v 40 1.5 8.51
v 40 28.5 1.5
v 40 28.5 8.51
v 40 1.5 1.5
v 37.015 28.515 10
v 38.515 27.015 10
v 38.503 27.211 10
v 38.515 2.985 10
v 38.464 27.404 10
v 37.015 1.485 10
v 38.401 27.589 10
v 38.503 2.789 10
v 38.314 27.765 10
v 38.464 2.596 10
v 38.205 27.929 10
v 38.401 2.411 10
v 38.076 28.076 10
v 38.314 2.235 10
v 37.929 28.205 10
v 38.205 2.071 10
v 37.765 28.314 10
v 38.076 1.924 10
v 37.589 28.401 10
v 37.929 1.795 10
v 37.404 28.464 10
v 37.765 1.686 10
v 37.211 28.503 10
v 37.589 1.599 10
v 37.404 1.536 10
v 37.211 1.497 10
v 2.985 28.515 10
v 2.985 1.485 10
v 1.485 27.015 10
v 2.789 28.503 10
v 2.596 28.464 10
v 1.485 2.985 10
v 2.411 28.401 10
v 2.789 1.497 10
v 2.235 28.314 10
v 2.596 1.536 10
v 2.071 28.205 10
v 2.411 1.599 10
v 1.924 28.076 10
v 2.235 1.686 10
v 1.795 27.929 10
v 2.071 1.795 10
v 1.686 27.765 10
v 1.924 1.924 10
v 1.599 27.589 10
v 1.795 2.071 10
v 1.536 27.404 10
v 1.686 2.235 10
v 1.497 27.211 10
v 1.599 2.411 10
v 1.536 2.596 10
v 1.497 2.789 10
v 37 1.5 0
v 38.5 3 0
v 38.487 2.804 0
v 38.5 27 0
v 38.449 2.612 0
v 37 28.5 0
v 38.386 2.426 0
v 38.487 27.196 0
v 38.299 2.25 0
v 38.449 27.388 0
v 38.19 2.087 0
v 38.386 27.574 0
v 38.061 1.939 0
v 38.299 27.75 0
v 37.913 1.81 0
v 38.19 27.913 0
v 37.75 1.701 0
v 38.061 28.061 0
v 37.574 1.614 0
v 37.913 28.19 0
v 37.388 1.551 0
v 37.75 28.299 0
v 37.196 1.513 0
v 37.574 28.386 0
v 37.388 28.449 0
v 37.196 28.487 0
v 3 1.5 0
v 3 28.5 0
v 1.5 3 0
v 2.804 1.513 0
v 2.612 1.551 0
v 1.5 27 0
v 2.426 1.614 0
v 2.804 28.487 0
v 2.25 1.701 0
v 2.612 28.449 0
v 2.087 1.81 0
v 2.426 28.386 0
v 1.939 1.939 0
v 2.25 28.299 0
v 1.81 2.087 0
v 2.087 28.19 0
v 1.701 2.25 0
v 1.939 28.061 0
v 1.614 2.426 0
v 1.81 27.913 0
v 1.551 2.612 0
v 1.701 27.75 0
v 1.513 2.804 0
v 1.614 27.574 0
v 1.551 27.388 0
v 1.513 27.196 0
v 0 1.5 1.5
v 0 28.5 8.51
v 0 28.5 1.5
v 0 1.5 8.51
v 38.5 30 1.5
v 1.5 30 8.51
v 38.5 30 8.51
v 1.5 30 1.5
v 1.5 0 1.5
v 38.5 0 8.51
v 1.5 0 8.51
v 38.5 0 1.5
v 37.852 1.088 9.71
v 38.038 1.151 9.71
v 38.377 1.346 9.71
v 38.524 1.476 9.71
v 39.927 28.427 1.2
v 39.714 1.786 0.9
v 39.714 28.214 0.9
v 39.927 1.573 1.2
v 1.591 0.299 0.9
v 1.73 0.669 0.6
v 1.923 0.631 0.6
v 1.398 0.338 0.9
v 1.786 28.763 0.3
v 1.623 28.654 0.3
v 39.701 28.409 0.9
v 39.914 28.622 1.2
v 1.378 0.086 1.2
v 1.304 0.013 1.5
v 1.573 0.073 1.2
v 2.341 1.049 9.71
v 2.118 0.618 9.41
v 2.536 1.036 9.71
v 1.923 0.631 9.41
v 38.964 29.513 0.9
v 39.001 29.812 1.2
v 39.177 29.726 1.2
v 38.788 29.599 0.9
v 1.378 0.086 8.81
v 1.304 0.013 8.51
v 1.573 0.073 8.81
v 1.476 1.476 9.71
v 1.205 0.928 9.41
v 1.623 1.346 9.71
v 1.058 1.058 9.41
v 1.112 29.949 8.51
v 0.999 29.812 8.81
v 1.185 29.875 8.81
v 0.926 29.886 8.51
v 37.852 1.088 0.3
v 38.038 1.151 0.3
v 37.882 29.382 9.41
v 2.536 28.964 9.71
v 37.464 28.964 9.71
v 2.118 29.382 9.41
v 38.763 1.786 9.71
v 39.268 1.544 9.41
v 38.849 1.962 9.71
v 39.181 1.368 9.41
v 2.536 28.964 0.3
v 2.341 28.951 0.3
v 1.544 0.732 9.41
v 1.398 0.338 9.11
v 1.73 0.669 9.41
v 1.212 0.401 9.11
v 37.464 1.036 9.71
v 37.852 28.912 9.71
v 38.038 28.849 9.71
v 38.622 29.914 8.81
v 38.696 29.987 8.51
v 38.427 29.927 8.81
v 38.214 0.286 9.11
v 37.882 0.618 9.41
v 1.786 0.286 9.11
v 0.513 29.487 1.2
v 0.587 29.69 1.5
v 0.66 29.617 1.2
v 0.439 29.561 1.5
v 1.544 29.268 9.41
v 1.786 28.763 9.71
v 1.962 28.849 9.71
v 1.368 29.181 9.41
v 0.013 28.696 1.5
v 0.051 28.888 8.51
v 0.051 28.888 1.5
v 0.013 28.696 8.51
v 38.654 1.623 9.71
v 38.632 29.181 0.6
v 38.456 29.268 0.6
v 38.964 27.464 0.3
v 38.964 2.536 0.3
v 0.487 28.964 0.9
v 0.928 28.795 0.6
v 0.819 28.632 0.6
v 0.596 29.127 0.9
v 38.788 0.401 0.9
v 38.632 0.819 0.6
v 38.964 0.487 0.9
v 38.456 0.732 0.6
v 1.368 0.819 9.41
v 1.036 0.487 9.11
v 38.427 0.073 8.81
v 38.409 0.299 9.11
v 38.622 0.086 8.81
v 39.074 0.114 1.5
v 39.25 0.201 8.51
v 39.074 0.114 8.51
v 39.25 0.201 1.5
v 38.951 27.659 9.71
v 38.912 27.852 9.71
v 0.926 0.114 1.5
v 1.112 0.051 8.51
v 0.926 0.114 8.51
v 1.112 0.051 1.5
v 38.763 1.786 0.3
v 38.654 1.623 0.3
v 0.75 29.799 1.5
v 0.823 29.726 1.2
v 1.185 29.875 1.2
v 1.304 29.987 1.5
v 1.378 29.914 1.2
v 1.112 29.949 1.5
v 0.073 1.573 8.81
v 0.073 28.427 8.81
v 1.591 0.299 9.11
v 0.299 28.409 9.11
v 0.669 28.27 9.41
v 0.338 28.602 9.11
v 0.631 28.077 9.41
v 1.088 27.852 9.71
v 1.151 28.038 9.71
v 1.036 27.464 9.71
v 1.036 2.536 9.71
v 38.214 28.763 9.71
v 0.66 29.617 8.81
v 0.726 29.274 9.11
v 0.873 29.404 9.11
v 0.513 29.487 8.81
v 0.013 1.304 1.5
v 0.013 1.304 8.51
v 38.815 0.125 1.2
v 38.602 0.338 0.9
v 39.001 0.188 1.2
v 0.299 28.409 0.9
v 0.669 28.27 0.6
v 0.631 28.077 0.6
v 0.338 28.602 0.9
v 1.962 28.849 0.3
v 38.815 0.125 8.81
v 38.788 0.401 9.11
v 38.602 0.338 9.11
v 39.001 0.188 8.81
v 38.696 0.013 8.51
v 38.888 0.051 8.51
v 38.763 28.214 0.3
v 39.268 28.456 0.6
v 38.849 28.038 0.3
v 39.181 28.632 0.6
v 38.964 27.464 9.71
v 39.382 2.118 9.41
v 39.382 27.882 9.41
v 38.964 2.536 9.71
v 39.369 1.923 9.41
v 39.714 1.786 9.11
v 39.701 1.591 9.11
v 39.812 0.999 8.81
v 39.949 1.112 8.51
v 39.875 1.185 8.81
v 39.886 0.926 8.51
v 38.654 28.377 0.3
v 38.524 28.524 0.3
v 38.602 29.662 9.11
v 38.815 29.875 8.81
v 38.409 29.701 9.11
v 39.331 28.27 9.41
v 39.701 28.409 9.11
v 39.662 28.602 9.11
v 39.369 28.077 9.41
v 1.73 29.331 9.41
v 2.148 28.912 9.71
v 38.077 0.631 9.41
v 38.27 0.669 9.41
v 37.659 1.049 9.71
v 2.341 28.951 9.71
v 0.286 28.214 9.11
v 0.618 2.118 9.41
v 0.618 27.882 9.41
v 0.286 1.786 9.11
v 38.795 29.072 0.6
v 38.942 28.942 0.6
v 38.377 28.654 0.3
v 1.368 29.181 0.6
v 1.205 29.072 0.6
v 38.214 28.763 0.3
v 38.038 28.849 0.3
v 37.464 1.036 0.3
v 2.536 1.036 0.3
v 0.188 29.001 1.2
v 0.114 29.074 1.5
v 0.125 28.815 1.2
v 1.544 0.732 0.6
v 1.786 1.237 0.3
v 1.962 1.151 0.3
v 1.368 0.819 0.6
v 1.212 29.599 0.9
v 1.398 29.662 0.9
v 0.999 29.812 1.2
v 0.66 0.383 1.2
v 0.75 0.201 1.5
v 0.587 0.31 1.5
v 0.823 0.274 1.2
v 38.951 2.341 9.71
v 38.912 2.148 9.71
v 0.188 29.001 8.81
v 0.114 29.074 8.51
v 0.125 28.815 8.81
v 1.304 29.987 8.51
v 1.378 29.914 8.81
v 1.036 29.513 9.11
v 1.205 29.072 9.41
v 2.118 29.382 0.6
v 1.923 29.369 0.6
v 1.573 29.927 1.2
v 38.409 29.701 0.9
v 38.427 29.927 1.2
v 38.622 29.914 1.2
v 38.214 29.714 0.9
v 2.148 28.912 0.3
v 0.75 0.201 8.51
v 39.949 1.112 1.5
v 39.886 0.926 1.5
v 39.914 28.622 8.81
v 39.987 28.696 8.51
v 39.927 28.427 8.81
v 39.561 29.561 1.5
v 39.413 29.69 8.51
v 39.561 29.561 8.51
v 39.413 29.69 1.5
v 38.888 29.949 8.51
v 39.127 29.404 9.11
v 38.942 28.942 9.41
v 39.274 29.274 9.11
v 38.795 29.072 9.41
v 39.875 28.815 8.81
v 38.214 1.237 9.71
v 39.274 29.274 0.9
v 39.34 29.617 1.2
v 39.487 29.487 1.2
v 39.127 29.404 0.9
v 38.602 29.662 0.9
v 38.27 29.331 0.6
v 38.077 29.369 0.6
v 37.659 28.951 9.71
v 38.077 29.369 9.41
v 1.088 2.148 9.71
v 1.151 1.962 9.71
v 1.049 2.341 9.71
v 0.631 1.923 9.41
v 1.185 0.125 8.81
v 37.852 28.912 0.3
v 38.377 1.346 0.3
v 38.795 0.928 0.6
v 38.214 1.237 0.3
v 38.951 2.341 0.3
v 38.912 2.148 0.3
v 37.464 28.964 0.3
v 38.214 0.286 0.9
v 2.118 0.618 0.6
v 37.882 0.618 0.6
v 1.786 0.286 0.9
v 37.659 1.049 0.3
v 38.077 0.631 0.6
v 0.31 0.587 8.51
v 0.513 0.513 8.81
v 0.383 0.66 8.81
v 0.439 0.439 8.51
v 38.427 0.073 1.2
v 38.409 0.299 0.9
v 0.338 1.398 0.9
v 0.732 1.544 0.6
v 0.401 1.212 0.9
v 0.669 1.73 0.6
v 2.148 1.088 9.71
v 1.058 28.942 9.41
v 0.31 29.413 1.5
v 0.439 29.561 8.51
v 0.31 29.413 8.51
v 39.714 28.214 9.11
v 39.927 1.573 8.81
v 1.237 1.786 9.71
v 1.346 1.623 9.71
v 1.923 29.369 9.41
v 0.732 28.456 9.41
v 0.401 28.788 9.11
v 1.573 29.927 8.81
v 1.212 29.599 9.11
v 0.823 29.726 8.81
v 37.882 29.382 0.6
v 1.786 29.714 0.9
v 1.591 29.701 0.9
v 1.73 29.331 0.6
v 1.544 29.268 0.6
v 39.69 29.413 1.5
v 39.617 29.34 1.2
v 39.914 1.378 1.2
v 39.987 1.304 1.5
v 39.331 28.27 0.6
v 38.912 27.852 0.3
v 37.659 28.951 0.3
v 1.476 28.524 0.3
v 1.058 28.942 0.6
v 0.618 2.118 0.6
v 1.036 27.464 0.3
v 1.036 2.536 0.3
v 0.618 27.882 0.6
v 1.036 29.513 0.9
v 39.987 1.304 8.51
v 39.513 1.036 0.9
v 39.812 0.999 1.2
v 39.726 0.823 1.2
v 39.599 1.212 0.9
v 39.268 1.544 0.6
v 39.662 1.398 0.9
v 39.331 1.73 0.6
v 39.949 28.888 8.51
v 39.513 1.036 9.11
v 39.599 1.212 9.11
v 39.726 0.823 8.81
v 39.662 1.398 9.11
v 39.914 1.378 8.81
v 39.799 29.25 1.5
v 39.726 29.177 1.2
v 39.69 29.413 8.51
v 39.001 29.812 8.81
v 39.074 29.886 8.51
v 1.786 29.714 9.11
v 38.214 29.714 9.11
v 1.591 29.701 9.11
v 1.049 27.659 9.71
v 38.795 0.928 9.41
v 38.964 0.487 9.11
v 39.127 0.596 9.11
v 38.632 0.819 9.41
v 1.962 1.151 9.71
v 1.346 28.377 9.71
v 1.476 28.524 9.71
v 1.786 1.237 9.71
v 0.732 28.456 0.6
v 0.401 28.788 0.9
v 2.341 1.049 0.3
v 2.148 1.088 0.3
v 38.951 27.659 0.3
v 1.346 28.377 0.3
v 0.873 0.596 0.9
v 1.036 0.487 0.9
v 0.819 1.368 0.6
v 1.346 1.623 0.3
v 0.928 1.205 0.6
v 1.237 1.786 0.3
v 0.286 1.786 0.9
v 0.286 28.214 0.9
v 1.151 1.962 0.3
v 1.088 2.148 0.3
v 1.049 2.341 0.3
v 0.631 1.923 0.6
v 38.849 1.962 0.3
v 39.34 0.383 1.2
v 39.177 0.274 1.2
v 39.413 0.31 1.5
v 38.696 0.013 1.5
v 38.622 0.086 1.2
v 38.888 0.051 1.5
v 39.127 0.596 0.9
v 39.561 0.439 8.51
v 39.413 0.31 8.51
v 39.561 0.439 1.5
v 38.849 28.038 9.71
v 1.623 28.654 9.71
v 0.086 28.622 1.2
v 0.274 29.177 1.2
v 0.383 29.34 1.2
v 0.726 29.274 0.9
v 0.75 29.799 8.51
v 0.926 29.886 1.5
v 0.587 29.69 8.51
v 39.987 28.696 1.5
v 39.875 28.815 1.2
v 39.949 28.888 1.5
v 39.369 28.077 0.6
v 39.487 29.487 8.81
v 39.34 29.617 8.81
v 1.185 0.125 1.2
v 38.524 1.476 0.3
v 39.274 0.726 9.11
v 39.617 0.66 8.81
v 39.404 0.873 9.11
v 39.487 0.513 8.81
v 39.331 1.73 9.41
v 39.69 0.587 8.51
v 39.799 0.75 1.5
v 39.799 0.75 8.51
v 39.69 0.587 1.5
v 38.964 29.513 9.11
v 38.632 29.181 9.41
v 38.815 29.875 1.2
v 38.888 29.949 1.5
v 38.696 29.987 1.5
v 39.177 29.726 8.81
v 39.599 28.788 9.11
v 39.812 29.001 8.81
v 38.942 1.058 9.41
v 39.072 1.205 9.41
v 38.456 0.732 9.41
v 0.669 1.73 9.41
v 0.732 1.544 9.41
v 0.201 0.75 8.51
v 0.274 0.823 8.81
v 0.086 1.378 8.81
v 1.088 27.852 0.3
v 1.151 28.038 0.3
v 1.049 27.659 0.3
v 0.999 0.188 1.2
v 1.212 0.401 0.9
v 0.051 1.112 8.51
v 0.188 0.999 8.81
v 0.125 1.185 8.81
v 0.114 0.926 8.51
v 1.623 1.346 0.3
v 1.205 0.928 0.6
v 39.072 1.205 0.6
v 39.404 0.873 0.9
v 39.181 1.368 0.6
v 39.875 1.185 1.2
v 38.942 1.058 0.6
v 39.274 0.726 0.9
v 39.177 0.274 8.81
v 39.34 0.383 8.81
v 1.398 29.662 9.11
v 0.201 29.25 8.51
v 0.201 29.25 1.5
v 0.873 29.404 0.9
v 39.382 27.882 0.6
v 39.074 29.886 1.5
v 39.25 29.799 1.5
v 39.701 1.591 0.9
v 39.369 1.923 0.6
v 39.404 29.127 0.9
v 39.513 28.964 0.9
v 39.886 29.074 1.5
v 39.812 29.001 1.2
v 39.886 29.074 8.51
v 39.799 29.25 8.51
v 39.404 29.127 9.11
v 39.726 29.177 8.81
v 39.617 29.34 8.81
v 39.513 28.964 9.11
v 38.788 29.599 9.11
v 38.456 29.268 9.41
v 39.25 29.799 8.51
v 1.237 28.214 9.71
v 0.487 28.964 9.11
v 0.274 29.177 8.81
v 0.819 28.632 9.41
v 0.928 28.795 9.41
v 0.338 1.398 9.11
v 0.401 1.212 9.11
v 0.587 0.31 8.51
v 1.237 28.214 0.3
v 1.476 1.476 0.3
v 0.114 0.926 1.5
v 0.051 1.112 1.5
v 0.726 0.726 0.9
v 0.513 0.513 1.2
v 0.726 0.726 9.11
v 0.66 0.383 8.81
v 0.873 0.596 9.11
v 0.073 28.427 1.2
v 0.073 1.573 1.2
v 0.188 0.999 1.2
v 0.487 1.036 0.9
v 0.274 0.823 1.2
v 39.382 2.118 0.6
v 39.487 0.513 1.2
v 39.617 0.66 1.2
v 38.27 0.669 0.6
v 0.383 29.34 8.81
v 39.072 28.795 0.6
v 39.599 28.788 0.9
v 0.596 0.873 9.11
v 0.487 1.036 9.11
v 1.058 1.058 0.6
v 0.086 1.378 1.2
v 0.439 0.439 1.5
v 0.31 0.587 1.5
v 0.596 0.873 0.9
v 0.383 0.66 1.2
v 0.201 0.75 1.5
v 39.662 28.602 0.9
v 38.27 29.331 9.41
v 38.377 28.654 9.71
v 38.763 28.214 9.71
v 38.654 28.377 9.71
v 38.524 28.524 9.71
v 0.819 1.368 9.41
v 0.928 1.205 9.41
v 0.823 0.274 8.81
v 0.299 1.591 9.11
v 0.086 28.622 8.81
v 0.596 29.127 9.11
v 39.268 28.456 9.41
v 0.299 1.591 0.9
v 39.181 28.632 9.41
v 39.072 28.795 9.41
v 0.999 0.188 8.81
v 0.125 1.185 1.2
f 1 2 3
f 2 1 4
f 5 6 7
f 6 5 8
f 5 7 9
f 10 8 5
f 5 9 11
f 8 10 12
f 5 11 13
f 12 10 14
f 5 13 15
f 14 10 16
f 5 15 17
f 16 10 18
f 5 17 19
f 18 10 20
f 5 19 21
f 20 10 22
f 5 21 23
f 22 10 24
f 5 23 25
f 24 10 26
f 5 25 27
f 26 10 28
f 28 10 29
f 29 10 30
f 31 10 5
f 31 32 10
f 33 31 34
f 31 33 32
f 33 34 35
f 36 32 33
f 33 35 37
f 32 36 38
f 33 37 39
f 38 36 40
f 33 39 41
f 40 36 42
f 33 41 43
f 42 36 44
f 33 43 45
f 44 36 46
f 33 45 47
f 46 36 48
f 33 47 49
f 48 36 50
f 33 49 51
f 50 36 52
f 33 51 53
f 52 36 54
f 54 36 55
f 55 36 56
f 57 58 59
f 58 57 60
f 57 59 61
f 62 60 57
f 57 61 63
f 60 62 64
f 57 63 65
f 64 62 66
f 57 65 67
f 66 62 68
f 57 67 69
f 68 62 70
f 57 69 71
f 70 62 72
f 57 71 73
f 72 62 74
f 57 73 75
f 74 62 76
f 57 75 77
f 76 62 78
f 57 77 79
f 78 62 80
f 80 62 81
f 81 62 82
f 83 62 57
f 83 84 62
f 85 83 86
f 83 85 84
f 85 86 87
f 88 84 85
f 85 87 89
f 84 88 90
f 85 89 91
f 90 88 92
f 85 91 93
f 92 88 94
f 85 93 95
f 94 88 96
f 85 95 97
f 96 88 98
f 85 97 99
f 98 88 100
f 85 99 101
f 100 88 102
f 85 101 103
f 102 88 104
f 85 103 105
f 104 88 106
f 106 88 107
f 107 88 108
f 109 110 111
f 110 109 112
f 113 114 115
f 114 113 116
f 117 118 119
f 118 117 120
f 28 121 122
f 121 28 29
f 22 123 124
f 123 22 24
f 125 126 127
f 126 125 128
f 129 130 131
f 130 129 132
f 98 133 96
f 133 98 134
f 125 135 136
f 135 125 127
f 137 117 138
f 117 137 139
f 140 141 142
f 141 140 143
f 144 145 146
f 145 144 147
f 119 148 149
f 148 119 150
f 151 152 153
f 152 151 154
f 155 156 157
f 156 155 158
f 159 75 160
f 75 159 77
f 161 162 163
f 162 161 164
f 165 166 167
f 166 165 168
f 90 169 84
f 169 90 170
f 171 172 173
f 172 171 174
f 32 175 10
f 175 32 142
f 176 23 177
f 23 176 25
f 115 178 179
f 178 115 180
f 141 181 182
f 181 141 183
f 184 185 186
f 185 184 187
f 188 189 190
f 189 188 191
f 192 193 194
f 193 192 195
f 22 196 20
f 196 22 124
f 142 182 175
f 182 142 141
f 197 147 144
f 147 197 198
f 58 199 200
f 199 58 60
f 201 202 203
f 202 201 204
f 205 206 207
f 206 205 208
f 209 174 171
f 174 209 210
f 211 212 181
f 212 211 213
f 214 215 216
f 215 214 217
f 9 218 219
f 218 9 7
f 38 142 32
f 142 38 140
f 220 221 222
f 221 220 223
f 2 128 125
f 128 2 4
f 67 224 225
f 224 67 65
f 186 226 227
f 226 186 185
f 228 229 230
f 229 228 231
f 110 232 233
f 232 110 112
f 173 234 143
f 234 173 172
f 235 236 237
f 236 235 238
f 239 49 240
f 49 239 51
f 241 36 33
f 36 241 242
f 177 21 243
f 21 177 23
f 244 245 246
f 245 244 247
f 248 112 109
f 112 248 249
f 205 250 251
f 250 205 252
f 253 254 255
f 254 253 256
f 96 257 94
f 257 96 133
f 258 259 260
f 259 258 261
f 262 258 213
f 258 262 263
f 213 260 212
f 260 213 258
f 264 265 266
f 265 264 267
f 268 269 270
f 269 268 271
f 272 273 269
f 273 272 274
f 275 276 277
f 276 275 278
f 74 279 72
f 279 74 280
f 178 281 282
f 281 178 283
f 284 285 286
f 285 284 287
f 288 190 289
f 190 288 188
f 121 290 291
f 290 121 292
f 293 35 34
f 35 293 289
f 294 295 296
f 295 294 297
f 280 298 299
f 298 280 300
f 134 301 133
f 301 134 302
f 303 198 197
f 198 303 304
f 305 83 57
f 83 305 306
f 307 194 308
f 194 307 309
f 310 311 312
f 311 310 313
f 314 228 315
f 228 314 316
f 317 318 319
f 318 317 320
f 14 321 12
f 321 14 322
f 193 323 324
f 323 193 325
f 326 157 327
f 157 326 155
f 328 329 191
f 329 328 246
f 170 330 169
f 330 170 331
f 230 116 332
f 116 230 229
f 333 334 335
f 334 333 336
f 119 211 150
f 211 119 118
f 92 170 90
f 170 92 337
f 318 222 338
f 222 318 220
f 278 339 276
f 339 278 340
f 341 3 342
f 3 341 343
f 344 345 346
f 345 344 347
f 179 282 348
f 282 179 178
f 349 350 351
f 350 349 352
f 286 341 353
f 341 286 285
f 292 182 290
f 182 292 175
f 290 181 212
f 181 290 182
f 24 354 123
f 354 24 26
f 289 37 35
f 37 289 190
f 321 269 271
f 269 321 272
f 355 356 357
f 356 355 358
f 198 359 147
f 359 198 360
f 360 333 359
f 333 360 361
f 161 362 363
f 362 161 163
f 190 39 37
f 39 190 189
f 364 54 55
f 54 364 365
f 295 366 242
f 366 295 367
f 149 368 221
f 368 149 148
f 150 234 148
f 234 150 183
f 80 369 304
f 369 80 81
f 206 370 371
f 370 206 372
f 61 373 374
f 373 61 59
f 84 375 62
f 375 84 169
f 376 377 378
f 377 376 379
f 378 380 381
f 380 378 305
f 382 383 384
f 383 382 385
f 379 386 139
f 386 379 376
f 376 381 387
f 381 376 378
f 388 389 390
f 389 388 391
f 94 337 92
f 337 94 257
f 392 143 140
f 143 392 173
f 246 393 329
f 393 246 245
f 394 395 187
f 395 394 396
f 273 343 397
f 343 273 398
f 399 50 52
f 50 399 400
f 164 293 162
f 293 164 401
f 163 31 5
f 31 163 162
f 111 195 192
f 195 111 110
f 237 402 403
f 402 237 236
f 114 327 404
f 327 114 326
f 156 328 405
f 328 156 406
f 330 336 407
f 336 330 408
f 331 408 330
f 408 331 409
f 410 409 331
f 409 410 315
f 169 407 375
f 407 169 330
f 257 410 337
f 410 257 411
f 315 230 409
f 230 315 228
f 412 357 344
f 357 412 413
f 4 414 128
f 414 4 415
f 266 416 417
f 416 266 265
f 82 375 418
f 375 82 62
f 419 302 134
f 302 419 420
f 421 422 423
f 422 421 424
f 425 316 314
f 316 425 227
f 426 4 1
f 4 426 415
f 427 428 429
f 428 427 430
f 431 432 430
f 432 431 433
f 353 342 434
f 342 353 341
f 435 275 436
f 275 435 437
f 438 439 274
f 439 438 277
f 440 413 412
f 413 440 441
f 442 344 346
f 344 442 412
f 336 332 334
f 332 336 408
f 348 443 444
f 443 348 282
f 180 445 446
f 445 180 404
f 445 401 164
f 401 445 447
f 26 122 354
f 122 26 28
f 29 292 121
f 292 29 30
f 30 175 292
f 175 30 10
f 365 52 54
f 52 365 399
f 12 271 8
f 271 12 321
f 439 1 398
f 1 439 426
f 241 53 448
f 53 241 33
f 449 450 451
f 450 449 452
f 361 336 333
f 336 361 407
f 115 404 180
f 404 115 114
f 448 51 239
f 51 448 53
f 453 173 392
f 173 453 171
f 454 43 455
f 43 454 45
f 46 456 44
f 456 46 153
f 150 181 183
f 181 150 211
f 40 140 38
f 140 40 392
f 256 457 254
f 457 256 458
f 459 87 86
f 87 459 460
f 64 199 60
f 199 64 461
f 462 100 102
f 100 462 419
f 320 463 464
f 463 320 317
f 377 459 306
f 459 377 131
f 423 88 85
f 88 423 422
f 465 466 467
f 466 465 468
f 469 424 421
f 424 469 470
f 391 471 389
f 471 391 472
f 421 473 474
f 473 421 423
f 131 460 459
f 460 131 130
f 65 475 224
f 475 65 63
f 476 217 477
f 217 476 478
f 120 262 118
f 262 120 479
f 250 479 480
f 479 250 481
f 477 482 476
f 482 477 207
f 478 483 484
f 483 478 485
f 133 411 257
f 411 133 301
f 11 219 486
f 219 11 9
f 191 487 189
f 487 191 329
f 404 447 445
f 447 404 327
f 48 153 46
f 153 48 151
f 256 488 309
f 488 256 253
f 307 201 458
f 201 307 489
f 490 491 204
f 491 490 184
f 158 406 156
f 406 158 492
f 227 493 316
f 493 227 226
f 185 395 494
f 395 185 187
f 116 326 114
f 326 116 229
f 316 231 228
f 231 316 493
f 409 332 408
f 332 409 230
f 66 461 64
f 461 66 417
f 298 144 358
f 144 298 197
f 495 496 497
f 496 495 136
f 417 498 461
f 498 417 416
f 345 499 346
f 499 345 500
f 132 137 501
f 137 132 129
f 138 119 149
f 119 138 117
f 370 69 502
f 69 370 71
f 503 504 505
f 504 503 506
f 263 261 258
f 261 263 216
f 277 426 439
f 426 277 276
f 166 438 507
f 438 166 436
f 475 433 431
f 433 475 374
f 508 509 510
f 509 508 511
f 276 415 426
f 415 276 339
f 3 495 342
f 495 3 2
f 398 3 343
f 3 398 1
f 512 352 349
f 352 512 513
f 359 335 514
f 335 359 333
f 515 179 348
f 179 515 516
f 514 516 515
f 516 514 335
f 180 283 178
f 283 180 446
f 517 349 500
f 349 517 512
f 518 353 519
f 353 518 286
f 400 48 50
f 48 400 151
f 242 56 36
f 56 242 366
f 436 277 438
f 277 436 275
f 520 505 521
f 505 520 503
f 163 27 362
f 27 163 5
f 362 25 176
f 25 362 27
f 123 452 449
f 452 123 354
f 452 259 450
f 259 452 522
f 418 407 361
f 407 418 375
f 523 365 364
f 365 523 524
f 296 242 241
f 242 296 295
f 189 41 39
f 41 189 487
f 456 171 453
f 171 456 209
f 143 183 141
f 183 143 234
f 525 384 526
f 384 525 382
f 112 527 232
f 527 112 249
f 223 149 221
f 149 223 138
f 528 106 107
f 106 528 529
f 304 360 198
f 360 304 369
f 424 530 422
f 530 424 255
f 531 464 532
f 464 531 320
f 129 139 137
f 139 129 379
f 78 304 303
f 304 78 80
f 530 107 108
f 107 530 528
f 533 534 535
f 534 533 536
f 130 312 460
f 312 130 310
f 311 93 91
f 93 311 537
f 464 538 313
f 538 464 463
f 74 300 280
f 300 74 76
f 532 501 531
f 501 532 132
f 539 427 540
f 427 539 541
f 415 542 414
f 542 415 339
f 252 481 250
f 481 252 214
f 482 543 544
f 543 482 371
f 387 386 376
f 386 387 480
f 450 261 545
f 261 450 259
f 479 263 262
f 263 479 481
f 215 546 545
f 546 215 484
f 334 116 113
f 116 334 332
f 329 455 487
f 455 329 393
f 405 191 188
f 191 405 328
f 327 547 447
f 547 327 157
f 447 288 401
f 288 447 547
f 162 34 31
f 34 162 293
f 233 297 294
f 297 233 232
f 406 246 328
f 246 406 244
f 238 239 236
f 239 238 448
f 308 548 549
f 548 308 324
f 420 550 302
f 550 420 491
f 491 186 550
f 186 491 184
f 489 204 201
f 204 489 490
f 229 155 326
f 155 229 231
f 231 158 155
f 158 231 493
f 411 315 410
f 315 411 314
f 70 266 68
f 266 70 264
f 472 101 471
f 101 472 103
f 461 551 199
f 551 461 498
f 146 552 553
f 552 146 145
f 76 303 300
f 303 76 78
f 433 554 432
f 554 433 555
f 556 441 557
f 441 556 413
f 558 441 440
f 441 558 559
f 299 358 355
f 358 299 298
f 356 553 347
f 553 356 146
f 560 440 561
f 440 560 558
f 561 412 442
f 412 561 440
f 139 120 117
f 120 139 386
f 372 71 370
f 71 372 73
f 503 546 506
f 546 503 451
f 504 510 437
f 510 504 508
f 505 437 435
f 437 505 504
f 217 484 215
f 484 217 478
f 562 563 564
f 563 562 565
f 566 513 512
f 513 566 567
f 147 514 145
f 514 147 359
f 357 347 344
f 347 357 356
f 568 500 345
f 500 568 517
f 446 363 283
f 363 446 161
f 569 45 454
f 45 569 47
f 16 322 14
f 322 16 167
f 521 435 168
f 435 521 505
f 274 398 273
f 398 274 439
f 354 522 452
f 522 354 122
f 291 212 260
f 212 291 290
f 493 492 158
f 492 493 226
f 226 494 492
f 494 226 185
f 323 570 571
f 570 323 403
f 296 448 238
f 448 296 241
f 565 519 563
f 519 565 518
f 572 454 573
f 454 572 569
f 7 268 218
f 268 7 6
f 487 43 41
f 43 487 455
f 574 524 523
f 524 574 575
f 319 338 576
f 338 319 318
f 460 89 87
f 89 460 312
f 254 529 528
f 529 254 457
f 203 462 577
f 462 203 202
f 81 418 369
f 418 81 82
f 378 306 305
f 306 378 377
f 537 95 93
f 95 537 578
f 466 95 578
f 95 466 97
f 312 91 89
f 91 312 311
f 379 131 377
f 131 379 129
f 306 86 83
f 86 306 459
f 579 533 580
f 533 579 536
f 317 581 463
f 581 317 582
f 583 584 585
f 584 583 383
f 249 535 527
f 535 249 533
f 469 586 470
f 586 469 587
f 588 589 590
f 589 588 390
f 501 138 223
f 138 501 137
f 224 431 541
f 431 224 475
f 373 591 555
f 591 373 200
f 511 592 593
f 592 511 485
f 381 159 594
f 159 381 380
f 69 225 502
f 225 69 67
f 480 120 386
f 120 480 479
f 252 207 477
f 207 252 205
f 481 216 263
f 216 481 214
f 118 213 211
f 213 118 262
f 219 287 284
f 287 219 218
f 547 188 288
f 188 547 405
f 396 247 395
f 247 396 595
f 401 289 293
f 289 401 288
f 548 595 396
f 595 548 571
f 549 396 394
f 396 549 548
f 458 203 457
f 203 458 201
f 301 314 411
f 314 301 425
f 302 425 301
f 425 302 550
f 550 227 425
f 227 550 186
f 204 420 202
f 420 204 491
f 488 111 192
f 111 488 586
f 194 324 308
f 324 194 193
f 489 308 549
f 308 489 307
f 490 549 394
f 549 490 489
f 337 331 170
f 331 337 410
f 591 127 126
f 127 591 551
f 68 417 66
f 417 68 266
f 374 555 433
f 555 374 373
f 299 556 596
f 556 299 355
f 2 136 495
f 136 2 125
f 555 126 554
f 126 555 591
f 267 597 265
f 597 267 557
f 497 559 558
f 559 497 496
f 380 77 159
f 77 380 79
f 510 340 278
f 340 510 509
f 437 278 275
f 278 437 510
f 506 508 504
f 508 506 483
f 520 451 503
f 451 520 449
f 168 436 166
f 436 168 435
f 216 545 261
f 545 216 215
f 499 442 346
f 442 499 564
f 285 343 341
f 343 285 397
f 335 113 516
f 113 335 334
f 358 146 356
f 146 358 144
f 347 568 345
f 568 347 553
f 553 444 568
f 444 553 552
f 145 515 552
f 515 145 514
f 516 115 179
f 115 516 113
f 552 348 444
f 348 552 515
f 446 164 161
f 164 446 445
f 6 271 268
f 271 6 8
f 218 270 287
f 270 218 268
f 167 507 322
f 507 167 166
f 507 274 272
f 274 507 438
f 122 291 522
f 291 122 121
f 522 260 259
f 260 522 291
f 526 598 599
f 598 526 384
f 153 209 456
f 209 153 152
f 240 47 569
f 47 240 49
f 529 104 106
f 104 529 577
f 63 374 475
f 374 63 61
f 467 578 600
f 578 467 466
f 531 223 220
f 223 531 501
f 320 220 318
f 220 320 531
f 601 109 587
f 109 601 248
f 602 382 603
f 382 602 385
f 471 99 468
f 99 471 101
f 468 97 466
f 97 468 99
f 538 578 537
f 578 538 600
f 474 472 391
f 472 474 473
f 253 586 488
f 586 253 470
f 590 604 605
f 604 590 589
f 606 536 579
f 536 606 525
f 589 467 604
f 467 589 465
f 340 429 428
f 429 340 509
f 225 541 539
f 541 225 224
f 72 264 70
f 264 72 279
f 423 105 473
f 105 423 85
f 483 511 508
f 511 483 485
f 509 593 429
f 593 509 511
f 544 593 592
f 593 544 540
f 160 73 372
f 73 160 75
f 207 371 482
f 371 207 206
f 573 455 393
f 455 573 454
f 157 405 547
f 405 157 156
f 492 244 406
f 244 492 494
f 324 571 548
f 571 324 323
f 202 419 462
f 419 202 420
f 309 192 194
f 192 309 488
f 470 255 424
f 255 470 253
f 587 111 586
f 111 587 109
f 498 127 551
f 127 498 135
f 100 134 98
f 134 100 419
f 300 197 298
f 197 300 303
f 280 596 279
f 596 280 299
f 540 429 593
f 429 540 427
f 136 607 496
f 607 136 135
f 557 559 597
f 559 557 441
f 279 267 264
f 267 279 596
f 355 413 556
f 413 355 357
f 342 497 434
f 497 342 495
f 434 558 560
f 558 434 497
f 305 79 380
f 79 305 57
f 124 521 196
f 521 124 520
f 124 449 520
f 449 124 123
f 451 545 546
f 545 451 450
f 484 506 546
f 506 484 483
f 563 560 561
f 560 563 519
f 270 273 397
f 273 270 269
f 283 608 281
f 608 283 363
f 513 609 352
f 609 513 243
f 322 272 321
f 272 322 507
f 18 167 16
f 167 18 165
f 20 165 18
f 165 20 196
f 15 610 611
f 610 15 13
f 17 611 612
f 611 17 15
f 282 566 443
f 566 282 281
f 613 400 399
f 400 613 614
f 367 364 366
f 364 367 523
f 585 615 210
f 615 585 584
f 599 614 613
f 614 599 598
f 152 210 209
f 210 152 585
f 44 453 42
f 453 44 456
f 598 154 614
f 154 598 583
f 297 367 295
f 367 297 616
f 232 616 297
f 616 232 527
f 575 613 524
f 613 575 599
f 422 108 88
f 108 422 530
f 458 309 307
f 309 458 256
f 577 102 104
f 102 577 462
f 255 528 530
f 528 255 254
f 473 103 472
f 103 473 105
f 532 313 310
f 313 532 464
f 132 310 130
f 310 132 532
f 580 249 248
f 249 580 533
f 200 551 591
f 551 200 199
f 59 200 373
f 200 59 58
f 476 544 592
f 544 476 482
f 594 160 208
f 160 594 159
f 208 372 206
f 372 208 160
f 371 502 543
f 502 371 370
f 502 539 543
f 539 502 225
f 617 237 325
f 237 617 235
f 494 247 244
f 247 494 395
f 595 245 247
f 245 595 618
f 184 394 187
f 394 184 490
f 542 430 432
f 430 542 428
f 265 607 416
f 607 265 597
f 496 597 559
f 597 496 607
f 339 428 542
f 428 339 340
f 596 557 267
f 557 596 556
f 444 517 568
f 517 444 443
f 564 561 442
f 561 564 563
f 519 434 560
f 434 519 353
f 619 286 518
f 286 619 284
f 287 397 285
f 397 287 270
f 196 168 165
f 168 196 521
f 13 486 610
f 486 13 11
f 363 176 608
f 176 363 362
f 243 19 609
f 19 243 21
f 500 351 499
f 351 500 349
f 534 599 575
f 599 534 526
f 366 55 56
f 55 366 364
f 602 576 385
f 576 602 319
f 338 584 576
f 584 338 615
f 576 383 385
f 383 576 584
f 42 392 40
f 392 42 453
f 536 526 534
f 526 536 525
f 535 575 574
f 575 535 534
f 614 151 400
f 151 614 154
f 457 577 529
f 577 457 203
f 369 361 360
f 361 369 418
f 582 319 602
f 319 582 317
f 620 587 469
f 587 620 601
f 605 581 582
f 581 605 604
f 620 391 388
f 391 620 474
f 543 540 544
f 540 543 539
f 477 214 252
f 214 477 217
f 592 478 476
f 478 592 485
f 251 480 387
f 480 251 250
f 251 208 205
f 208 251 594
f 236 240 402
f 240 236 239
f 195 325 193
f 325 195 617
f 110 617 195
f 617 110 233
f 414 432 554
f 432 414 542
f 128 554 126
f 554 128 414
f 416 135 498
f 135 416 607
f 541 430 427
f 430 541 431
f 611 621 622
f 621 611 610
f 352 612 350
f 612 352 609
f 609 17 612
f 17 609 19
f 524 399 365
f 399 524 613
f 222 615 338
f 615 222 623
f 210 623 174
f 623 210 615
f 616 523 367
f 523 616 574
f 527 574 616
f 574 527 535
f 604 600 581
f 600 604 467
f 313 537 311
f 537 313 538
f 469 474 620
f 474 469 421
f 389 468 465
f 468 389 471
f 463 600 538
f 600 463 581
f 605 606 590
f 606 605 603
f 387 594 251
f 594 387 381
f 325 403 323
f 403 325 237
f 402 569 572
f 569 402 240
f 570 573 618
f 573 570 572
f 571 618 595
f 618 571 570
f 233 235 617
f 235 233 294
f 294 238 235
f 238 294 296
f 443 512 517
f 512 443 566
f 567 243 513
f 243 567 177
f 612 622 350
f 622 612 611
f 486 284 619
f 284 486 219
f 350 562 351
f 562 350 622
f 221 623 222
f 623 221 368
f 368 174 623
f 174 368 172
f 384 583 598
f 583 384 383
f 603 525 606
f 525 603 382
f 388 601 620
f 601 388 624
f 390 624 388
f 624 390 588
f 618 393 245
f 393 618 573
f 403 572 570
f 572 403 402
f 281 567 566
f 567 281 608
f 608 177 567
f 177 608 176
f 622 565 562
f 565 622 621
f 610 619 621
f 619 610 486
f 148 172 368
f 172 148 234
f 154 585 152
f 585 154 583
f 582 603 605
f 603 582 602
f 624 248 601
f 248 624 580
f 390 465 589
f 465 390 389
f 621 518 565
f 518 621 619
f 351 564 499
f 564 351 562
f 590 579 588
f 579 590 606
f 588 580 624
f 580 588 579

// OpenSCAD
// units=mm — generated by scad_emitter.py
// part=unnamed
$fn = 48;

intersection() { cube([40, 30, 10]); hull() { translate([3, 3, 0]) linear_extrude(height=0.01) offset(r=1.5) square([34, 24]); translate([2.5365, 2.5365, 0.3]) linear_extrude(height=0.01) offset(r=1.5) square([34.9271, 24.9271]); translate([2.1183, 2.1183, 0.6]) linear_extrude(height=0.01) offset(r=1.5) square([35.7634, 25.7634]); translate([1.7865, 1.7865, 0.9]) linear_extrude(height=0.01) offset(r=1.5) square([36.4271, 26.4271]); translate([1.5734, 1.5734, 1.2]) linear_extrude(height=0.01) offset(r=1.5) square([36.8532, 26.8532]); translate([1.5, 1.5, 1.5]) linear_extrude(height=0.01) offset(r=1.5) square([37, 27]); translate([3, 3, 10]) linear_extrude(height=0.01) offset(r=1.5) square([34, 24]); translate([2.5365, 2.5365, 9.7]) linear_extrude(height=0.01) offset(r=1.5) square([34.9271, 24.9271]); translate([2.1183, 2.1183, 9.4]) linear_extrude(height=0.01) offset(r=1.5) square([35.7634, 25.7634]); translate([1.7865, 1.7865, 9.1]) linear_extrude(height=0.01) offset(r=1.5) square([36.4271, 26.4271]); translate([1.5734, 1.5734, 8.8]) linear_extrude(height=0.01) offset(r=1.5) square([36.8532, 26.8532]); translate([1.5, 1.5, 8.5]) linear_extrude(height=0.01) offset(r=1.5) square([37, 27]); } }
